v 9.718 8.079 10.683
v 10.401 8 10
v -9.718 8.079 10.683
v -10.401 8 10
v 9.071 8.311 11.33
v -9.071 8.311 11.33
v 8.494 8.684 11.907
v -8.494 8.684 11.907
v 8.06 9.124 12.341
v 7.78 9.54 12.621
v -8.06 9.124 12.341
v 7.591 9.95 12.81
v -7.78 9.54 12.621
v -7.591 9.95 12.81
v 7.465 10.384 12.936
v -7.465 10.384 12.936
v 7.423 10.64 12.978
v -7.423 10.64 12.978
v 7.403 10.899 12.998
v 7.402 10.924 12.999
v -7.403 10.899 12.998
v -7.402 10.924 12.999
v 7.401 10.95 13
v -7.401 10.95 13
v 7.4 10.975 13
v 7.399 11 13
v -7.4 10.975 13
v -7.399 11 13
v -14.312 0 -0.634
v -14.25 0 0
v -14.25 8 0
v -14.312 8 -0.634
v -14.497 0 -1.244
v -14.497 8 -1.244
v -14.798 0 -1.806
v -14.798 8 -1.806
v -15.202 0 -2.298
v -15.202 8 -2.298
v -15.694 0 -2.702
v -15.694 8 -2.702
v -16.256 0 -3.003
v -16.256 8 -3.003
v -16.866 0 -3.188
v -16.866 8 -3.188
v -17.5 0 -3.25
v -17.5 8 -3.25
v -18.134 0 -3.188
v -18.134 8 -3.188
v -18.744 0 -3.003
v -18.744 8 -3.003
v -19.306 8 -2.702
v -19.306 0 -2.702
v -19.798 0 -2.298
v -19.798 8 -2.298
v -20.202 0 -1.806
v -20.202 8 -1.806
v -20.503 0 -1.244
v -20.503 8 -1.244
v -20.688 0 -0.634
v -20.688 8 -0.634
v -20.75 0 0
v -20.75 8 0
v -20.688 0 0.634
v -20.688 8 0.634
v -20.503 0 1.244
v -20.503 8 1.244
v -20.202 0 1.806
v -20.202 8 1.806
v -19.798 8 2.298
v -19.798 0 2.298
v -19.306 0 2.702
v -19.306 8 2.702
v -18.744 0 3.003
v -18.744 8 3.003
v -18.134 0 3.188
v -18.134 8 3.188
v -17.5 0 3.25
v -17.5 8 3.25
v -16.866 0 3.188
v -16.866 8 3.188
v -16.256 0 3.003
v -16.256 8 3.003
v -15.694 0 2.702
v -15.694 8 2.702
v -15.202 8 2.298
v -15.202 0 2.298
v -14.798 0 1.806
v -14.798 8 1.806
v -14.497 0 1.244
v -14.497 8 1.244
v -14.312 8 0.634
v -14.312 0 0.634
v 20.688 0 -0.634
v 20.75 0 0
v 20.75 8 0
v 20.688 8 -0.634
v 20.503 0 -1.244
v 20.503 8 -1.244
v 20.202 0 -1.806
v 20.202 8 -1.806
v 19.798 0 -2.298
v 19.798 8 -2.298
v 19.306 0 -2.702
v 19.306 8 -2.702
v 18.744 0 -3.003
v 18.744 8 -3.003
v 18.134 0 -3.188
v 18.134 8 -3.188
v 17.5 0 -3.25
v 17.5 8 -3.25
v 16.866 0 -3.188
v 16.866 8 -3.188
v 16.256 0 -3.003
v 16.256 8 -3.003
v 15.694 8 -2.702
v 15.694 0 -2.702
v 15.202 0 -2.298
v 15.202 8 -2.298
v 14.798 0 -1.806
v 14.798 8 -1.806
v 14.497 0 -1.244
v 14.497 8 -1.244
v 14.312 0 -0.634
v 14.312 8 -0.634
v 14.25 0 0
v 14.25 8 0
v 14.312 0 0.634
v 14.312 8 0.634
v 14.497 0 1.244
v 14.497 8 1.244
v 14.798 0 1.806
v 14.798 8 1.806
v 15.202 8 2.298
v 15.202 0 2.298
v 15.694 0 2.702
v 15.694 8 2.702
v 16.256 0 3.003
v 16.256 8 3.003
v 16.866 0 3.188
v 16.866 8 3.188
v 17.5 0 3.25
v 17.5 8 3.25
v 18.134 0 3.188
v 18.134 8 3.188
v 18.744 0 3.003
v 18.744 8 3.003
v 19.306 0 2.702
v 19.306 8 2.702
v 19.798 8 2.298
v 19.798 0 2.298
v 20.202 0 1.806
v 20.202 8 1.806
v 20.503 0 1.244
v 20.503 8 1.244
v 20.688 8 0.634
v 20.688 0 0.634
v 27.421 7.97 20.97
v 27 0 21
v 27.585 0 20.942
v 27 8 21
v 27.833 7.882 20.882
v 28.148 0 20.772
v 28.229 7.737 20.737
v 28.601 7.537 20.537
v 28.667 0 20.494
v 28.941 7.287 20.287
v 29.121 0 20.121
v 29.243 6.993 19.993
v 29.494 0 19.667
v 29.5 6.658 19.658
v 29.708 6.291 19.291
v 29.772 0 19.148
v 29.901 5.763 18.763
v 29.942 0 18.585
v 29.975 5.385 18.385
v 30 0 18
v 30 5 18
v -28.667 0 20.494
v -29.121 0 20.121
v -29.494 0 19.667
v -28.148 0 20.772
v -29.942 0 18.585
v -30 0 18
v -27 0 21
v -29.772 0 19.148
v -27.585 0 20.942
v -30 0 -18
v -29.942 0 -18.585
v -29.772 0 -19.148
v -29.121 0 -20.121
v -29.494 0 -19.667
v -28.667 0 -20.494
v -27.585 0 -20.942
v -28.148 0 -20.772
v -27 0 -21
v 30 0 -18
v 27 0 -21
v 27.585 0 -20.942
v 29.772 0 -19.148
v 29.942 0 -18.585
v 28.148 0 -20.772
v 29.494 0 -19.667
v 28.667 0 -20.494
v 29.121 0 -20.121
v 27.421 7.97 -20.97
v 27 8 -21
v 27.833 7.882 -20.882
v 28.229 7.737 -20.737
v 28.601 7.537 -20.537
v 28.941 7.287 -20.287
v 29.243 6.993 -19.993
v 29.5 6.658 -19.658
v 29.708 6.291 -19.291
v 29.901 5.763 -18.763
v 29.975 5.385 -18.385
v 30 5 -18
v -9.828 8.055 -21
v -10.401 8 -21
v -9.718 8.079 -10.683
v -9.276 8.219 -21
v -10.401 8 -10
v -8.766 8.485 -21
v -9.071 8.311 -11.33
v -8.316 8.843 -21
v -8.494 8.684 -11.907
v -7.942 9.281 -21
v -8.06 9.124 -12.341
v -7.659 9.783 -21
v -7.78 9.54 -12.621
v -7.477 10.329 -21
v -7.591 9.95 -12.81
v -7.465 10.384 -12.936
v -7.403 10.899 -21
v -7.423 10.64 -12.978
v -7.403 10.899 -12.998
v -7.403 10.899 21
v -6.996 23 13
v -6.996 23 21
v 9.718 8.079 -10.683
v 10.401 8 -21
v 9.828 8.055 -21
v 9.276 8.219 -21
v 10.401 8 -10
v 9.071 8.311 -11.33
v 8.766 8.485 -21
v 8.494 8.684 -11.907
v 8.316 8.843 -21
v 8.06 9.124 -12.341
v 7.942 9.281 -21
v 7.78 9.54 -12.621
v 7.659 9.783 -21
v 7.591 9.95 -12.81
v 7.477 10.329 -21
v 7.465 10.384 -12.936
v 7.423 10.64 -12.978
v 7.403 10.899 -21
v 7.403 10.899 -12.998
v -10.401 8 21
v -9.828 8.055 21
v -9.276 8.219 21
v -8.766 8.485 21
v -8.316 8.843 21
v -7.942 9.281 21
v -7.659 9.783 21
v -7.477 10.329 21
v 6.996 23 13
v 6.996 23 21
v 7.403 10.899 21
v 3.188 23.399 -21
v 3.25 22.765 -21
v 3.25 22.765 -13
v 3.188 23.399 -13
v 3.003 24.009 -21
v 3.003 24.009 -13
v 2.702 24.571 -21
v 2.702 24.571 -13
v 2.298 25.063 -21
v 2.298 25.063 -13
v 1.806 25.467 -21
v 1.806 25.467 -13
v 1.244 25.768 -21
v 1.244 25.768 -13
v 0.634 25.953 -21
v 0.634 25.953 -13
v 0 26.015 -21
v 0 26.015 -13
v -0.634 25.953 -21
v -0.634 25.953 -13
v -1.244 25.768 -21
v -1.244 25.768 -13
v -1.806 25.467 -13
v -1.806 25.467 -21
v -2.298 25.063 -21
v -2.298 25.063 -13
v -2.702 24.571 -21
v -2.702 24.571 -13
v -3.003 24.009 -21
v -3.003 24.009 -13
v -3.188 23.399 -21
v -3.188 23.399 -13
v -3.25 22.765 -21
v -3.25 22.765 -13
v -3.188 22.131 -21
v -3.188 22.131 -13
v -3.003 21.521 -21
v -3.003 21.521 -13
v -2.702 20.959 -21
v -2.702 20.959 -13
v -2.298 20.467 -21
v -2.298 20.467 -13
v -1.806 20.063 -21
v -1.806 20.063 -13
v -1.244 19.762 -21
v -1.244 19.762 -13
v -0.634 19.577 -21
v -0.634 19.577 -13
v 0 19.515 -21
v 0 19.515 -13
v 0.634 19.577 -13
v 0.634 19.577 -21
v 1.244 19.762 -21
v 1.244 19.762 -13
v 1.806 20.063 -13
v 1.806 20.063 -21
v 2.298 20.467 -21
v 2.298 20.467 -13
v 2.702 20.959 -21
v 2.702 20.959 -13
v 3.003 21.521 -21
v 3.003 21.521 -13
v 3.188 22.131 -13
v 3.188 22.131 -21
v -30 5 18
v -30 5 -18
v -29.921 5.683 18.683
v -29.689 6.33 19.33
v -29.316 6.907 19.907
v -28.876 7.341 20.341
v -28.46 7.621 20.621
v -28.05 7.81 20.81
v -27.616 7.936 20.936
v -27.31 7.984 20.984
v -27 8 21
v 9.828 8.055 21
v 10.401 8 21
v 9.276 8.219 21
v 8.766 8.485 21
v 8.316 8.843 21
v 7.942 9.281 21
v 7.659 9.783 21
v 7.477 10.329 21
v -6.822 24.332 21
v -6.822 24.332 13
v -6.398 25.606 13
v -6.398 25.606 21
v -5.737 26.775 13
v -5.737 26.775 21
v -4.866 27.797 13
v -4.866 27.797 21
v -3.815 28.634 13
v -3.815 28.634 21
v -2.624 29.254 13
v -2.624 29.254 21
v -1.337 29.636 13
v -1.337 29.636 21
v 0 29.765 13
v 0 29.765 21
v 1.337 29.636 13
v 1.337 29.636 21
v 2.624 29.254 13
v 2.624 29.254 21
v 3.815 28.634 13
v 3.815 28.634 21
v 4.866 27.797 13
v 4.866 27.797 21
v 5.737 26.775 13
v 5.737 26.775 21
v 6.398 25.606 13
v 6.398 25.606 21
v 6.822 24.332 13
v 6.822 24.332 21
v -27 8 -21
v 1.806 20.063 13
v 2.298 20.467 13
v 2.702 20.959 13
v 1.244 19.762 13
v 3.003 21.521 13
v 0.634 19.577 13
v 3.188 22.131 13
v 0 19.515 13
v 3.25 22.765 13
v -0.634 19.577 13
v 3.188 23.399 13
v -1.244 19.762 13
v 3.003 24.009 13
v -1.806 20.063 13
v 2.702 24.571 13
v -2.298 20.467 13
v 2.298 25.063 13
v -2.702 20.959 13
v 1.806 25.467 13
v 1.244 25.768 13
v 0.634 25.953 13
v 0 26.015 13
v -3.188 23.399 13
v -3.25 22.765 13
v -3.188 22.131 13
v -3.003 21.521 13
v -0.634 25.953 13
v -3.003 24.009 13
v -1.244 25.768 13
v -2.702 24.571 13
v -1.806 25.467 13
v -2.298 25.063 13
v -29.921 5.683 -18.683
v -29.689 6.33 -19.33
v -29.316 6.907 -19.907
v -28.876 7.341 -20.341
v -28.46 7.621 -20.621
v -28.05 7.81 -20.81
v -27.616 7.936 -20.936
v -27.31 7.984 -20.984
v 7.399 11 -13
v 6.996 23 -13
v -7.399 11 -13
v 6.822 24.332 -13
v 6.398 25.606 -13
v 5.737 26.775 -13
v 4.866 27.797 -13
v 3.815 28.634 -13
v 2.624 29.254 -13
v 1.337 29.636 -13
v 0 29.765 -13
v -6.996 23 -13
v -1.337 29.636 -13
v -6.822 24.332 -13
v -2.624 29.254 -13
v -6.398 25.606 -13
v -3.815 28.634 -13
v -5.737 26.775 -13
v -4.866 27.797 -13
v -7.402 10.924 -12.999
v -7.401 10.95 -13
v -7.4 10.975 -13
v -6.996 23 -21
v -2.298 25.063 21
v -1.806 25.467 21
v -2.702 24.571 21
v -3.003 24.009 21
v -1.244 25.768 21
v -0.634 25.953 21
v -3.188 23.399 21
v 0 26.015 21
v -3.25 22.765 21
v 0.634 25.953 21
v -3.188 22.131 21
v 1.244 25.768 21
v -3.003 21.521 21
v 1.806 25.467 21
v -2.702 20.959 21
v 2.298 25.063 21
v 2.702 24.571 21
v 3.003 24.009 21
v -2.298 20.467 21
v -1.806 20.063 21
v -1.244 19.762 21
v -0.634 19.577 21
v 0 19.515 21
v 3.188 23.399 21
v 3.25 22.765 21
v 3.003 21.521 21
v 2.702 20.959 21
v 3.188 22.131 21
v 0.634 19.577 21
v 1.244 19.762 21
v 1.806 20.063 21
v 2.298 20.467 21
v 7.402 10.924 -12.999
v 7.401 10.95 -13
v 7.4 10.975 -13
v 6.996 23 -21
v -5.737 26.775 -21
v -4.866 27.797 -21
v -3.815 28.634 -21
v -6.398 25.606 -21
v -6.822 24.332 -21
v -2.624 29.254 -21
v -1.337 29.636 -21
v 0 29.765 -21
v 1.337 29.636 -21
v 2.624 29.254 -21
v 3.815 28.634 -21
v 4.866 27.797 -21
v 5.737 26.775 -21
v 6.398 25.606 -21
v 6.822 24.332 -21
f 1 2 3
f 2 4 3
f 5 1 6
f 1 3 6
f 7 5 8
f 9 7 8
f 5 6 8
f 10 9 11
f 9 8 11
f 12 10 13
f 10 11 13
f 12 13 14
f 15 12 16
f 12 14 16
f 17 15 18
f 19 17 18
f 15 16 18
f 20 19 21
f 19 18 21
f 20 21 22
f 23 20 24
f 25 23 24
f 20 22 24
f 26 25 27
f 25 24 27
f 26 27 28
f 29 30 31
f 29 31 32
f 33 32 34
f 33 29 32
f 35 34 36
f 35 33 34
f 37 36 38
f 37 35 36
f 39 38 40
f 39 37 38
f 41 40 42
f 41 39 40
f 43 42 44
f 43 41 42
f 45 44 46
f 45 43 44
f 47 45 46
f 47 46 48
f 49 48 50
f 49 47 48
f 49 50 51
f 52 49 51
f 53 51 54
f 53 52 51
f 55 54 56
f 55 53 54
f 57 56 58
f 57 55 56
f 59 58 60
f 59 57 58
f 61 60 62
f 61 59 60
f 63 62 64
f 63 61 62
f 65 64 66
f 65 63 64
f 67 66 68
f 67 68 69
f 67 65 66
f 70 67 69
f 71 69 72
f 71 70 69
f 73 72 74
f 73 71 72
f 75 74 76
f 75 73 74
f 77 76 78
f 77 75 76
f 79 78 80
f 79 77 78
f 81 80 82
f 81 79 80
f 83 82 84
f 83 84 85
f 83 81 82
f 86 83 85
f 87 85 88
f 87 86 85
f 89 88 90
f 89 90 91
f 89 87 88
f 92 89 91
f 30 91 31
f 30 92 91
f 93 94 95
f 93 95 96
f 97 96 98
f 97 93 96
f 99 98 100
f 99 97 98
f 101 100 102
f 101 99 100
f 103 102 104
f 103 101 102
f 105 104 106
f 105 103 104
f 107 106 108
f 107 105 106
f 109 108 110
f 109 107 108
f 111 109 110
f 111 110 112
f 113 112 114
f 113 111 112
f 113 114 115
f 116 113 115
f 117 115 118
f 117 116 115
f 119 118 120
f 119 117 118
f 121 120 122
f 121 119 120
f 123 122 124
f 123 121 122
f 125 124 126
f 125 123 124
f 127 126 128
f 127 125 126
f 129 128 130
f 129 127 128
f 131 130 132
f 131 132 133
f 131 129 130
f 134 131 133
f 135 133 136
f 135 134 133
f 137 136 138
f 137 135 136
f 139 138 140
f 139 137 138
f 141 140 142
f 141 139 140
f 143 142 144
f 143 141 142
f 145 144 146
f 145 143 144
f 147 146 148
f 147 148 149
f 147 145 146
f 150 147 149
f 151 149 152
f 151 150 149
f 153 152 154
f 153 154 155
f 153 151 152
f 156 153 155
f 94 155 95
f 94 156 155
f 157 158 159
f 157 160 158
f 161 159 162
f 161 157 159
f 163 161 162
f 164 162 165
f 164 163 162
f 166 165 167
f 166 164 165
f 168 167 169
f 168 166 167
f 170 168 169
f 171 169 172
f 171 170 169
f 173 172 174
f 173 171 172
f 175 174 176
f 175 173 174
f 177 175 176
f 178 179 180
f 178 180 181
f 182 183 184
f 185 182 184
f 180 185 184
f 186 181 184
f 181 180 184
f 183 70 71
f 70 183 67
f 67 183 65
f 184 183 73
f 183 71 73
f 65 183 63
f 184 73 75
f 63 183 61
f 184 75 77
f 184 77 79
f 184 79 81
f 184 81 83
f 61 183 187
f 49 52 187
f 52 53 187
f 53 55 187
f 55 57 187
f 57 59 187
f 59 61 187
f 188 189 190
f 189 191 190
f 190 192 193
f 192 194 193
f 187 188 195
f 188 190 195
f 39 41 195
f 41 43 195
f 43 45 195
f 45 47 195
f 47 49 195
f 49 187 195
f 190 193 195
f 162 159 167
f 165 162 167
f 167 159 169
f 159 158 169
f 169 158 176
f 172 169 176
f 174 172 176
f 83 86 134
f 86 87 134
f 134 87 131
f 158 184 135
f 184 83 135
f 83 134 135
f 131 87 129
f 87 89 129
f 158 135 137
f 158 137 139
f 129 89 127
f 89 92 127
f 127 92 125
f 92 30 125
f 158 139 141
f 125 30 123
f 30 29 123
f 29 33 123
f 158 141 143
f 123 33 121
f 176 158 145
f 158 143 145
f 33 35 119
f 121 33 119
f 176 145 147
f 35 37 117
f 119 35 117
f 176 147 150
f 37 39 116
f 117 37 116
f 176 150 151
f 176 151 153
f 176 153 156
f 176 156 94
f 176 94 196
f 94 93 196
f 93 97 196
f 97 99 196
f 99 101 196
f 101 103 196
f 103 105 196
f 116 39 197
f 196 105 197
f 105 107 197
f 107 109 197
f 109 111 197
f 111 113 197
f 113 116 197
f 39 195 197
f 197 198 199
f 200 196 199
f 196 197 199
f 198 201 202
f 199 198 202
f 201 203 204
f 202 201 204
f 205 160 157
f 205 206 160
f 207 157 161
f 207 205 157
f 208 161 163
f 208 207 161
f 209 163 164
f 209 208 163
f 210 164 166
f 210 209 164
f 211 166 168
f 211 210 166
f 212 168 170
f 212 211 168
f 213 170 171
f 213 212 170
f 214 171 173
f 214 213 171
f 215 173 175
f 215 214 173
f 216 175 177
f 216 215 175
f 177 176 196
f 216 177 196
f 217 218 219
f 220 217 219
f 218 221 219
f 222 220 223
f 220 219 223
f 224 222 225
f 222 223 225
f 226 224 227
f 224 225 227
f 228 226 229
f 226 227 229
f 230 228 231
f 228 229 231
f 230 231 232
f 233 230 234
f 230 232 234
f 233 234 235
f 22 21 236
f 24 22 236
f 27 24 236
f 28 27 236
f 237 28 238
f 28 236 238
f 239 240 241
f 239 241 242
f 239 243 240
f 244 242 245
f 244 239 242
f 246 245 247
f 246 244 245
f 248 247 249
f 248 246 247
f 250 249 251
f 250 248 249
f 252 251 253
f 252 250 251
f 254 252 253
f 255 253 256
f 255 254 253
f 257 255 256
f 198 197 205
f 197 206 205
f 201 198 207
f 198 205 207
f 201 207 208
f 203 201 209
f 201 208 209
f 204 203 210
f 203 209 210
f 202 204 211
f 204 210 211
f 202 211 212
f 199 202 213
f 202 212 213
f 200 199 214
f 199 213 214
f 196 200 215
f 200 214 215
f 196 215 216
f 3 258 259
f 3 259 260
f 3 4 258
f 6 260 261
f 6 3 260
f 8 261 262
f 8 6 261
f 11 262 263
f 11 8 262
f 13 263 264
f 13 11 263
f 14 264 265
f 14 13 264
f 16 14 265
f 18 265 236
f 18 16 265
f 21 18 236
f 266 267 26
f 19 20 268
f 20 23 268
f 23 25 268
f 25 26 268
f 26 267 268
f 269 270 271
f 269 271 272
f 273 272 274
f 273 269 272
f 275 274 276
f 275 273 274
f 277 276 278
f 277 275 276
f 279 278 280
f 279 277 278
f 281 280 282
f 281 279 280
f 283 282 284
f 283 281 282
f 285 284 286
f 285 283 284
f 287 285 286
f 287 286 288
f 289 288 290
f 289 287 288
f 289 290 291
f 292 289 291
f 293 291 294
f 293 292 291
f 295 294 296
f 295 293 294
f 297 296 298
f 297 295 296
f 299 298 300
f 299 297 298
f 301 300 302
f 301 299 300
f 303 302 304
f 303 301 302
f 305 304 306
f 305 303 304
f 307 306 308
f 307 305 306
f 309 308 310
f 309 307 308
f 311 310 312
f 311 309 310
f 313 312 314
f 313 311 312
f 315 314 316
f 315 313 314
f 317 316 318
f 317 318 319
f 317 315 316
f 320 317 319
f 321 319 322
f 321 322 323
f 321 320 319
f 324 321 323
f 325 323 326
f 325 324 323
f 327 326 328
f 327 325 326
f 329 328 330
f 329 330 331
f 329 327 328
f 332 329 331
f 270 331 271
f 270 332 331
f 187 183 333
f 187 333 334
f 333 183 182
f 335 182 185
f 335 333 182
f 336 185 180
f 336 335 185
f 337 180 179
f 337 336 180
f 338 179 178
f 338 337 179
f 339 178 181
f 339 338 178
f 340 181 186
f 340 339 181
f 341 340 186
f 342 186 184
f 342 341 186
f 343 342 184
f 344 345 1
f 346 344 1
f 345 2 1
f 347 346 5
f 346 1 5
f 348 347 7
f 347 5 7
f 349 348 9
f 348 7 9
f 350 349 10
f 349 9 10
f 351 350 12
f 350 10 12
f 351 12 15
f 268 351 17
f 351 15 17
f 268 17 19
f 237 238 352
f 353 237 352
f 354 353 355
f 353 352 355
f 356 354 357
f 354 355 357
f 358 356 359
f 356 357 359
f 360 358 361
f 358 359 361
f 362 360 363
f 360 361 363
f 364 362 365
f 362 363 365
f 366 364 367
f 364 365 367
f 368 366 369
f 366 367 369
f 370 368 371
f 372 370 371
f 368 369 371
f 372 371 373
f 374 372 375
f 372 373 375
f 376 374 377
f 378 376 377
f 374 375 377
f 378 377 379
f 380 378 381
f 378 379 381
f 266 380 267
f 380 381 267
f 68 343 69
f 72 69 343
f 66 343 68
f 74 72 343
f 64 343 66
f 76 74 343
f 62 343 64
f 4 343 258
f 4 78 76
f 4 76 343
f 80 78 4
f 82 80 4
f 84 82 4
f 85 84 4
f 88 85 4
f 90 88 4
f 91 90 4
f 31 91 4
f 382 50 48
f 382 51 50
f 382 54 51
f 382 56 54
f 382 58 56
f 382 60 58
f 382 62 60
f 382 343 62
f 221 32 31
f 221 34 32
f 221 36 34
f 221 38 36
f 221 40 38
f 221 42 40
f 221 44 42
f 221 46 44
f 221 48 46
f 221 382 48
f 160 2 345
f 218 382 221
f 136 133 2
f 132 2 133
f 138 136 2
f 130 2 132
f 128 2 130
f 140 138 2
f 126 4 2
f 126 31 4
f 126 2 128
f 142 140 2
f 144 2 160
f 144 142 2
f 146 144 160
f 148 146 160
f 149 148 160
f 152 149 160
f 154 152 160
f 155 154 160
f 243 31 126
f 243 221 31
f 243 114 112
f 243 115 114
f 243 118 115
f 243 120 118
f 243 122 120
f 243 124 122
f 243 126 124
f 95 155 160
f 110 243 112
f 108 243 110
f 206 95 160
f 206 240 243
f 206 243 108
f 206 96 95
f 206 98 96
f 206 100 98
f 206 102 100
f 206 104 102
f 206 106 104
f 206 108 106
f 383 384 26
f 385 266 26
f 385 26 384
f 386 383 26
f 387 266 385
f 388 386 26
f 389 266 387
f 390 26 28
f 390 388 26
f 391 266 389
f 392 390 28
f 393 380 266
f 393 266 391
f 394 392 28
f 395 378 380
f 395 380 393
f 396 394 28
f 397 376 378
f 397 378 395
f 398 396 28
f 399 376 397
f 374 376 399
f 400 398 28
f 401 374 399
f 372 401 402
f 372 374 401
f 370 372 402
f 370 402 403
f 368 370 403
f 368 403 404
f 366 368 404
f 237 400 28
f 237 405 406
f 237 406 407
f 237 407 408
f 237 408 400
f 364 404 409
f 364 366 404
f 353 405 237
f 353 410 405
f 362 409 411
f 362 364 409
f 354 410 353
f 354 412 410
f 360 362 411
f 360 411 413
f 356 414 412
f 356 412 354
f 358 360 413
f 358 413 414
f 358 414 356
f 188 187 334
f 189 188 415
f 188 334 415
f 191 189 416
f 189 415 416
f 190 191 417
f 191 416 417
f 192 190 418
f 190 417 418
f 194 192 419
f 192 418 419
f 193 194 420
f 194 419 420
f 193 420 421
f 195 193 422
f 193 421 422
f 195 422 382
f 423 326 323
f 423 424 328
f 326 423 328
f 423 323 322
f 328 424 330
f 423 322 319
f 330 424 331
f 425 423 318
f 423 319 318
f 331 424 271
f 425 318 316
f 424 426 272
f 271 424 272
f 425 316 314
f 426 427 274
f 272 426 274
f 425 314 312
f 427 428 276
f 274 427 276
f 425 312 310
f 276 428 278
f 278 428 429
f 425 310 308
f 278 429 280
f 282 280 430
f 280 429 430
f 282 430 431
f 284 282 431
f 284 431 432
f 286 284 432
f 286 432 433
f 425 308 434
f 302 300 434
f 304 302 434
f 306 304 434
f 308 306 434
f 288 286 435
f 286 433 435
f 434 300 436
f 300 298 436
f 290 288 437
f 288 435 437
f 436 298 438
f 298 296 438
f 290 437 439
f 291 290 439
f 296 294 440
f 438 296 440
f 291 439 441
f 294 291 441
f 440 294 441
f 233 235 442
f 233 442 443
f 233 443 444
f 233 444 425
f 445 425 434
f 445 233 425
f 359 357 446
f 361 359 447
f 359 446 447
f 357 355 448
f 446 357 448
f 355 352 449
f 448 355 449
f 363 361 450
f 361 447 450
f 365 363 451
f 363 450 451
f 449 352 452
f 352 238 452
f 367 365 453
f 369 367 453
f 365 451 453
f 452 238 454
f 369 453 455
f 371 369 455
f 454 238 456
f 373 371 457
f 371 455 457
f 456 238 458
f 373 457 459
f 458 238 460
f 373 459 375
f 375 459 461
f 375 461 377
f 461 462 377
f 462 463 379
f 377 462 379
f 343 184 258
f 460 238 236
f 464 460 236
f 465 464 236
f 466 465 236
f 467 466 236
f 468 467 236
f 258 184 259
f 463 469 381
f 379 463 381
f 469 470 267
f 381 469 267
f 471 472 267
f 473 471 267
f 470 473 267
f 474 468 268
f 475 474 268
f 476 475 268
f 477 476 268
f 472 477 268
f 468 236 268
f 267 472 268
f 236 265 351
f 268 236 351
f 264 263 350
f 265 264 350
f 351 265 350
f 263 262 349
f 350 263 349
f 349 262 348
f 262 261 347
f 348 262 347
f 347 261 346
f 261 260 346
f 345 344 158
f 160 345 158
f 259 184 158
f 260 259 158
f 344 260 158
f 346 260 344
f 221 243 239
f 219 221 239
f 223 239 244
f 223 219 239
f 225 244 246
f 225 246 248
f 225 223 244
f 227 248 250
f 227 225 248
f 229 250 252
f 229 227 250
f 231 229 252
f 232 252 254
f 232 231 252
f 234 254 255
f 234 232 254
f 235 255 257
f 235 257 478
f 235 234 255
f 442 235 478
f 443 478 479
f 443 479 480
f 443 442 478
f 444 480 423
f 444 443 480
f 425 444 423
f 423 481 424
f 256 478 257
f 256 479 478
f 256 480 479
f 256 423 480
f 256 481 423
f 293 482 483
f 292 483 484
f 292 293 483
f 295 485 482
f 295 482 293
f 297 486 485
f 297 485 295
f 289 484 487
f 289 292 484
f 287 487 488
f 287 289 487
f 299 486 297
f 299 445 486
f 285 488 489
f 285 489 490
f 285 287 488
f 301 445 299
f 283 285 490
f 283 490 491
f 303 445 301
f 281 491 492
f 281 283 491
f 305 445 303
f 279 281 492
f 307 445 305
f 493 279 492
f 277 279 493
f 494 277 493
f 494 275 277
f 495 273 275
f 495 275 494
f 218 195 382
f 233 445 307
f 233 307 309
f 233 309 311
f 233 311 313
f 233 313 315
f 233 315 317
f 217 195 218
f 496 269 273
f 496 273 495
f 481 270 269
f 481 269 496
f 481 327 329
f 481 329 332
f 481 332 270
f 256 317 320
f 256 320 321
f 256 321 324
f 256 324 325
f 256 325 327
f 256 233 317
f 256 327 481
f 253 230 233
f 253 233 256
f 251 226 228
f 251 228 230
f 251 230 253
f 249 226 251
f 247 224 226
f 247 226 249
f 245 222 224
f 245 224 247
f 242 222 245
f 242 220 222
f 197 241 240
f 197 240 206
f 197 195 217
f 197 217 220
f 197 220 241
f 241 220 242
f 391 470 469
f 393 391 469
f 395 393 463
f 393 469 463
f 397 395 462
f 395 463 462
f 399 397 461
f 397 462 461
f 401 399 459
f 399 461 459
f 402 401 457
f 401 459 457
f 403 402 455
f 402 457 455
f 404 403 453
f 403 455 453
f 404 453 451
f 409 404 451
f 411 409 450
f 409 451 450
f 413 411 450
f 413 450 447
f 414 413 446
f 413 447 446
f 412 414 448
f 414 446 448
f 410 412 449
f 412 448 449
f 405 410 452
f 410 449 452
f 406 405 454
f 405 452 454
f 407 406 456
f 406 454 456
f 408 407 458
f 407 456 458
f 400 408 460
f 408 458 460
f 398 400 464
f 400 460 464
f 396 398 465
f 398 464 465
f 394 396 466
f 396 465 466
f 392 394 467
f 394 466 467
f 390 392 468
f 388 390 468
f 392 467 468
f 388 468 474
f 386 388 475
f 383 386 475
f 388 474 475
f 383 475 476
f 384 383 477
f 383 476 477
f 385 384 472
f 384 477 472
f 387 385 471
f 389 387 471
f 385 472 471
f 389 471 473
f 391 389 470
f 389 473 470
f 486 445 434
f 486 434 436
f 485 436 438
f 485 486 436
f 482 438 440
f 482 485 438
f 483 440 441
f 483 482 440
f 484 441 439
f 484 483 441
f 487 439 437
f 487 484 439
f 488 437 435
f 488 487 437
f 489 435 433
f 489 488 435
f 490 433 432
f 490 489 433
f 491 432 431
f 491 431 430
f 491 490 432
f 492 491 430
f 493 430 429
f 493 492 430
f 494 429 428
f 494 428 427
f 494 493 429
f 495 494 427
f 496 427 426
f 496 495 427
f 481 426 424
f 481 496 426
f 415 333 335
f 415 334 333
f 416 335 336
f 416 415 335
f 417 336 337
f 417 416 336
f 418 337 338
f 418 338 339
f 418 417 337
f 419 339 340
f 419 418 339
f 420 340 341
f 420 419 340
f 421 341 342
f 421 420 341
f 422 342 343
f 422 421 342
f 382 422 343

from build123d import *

# Parameters (mm, degrees)
SKETCH2_W           = 60
SKETCH2_H           = 42
SKETCH2_R           = 3.25
BOSS_EXTRUDE1_DEPTH = 8
SKETCH3_R           = 3.25
BOSS_EXTRUDE2_DEPTH = 8
FILLET1_R           = 3


with BuildPart() as part:
    # Sketch2 → Boss-Extrude1 (new body)
    with BuildSketch(Plane(origin=(0, 0, 0), x_dir=(1, 0, 0), z_dir=(0, 1, 0))):
        Rectangle(SKETCH2_W, SKETCH2_H)
        with Locations((-17.5, 0)):
            Circle(SKETCH2_R, mode=Mode.SUBTRACT)
        with Locations((17.5, 0)):
            Circle(SKETCH2_R, mode=Mode.SUBTRACT)
    extrude(amount=BOSS_EXTRUDE1_DEPTH)

    # Sketch3 → Boss-Extrude2 (add)
    with BuildSketch(Plane.XY.offset(21)):
        with BuildLine():
            Line((-7.5, 8), (-6.996052809, 23))
            ThreePointArc((-6.996052809, 23), (0, 29.764957256), (6.996052809, 23))
            Line((6.996052809, 23), (7.5, 8))
            Line((7.5, 8), (-7.5, 8))
        make_face()
        with Locations((0, 22.764957256)):
            Circle(SKETCH3_R, mode=Mode.SUBTRACT)
    boss_extrude2 = extrude(amount=-BOSS_EXTRUDE2_DEPTH)

    # Mirror1: Boss-Extrude2 across plane
    add(boss_extrude2.mirror(Plane.XY))

    # Fillet1
    fillet1_edges = [part.edges().sort_by_distance(p)[0] for p in [
        (-30, 8, 0),
        (0, 8, 13),
        (7.5, 8, 17),
        (-7.5, 8, 17),
        (0, 8, -13),
        (-7.5, 8, -17),
        (7.5, 8, -17),
        (30, 8, 0),
        (30, 4, 21),
        (-30, 4, 21),
        (-30, 4, -21),
        (30, 4, -21),
    ]]
    fillet(fillet1_edges, radius=FILLET1_R)


solid = part.part
